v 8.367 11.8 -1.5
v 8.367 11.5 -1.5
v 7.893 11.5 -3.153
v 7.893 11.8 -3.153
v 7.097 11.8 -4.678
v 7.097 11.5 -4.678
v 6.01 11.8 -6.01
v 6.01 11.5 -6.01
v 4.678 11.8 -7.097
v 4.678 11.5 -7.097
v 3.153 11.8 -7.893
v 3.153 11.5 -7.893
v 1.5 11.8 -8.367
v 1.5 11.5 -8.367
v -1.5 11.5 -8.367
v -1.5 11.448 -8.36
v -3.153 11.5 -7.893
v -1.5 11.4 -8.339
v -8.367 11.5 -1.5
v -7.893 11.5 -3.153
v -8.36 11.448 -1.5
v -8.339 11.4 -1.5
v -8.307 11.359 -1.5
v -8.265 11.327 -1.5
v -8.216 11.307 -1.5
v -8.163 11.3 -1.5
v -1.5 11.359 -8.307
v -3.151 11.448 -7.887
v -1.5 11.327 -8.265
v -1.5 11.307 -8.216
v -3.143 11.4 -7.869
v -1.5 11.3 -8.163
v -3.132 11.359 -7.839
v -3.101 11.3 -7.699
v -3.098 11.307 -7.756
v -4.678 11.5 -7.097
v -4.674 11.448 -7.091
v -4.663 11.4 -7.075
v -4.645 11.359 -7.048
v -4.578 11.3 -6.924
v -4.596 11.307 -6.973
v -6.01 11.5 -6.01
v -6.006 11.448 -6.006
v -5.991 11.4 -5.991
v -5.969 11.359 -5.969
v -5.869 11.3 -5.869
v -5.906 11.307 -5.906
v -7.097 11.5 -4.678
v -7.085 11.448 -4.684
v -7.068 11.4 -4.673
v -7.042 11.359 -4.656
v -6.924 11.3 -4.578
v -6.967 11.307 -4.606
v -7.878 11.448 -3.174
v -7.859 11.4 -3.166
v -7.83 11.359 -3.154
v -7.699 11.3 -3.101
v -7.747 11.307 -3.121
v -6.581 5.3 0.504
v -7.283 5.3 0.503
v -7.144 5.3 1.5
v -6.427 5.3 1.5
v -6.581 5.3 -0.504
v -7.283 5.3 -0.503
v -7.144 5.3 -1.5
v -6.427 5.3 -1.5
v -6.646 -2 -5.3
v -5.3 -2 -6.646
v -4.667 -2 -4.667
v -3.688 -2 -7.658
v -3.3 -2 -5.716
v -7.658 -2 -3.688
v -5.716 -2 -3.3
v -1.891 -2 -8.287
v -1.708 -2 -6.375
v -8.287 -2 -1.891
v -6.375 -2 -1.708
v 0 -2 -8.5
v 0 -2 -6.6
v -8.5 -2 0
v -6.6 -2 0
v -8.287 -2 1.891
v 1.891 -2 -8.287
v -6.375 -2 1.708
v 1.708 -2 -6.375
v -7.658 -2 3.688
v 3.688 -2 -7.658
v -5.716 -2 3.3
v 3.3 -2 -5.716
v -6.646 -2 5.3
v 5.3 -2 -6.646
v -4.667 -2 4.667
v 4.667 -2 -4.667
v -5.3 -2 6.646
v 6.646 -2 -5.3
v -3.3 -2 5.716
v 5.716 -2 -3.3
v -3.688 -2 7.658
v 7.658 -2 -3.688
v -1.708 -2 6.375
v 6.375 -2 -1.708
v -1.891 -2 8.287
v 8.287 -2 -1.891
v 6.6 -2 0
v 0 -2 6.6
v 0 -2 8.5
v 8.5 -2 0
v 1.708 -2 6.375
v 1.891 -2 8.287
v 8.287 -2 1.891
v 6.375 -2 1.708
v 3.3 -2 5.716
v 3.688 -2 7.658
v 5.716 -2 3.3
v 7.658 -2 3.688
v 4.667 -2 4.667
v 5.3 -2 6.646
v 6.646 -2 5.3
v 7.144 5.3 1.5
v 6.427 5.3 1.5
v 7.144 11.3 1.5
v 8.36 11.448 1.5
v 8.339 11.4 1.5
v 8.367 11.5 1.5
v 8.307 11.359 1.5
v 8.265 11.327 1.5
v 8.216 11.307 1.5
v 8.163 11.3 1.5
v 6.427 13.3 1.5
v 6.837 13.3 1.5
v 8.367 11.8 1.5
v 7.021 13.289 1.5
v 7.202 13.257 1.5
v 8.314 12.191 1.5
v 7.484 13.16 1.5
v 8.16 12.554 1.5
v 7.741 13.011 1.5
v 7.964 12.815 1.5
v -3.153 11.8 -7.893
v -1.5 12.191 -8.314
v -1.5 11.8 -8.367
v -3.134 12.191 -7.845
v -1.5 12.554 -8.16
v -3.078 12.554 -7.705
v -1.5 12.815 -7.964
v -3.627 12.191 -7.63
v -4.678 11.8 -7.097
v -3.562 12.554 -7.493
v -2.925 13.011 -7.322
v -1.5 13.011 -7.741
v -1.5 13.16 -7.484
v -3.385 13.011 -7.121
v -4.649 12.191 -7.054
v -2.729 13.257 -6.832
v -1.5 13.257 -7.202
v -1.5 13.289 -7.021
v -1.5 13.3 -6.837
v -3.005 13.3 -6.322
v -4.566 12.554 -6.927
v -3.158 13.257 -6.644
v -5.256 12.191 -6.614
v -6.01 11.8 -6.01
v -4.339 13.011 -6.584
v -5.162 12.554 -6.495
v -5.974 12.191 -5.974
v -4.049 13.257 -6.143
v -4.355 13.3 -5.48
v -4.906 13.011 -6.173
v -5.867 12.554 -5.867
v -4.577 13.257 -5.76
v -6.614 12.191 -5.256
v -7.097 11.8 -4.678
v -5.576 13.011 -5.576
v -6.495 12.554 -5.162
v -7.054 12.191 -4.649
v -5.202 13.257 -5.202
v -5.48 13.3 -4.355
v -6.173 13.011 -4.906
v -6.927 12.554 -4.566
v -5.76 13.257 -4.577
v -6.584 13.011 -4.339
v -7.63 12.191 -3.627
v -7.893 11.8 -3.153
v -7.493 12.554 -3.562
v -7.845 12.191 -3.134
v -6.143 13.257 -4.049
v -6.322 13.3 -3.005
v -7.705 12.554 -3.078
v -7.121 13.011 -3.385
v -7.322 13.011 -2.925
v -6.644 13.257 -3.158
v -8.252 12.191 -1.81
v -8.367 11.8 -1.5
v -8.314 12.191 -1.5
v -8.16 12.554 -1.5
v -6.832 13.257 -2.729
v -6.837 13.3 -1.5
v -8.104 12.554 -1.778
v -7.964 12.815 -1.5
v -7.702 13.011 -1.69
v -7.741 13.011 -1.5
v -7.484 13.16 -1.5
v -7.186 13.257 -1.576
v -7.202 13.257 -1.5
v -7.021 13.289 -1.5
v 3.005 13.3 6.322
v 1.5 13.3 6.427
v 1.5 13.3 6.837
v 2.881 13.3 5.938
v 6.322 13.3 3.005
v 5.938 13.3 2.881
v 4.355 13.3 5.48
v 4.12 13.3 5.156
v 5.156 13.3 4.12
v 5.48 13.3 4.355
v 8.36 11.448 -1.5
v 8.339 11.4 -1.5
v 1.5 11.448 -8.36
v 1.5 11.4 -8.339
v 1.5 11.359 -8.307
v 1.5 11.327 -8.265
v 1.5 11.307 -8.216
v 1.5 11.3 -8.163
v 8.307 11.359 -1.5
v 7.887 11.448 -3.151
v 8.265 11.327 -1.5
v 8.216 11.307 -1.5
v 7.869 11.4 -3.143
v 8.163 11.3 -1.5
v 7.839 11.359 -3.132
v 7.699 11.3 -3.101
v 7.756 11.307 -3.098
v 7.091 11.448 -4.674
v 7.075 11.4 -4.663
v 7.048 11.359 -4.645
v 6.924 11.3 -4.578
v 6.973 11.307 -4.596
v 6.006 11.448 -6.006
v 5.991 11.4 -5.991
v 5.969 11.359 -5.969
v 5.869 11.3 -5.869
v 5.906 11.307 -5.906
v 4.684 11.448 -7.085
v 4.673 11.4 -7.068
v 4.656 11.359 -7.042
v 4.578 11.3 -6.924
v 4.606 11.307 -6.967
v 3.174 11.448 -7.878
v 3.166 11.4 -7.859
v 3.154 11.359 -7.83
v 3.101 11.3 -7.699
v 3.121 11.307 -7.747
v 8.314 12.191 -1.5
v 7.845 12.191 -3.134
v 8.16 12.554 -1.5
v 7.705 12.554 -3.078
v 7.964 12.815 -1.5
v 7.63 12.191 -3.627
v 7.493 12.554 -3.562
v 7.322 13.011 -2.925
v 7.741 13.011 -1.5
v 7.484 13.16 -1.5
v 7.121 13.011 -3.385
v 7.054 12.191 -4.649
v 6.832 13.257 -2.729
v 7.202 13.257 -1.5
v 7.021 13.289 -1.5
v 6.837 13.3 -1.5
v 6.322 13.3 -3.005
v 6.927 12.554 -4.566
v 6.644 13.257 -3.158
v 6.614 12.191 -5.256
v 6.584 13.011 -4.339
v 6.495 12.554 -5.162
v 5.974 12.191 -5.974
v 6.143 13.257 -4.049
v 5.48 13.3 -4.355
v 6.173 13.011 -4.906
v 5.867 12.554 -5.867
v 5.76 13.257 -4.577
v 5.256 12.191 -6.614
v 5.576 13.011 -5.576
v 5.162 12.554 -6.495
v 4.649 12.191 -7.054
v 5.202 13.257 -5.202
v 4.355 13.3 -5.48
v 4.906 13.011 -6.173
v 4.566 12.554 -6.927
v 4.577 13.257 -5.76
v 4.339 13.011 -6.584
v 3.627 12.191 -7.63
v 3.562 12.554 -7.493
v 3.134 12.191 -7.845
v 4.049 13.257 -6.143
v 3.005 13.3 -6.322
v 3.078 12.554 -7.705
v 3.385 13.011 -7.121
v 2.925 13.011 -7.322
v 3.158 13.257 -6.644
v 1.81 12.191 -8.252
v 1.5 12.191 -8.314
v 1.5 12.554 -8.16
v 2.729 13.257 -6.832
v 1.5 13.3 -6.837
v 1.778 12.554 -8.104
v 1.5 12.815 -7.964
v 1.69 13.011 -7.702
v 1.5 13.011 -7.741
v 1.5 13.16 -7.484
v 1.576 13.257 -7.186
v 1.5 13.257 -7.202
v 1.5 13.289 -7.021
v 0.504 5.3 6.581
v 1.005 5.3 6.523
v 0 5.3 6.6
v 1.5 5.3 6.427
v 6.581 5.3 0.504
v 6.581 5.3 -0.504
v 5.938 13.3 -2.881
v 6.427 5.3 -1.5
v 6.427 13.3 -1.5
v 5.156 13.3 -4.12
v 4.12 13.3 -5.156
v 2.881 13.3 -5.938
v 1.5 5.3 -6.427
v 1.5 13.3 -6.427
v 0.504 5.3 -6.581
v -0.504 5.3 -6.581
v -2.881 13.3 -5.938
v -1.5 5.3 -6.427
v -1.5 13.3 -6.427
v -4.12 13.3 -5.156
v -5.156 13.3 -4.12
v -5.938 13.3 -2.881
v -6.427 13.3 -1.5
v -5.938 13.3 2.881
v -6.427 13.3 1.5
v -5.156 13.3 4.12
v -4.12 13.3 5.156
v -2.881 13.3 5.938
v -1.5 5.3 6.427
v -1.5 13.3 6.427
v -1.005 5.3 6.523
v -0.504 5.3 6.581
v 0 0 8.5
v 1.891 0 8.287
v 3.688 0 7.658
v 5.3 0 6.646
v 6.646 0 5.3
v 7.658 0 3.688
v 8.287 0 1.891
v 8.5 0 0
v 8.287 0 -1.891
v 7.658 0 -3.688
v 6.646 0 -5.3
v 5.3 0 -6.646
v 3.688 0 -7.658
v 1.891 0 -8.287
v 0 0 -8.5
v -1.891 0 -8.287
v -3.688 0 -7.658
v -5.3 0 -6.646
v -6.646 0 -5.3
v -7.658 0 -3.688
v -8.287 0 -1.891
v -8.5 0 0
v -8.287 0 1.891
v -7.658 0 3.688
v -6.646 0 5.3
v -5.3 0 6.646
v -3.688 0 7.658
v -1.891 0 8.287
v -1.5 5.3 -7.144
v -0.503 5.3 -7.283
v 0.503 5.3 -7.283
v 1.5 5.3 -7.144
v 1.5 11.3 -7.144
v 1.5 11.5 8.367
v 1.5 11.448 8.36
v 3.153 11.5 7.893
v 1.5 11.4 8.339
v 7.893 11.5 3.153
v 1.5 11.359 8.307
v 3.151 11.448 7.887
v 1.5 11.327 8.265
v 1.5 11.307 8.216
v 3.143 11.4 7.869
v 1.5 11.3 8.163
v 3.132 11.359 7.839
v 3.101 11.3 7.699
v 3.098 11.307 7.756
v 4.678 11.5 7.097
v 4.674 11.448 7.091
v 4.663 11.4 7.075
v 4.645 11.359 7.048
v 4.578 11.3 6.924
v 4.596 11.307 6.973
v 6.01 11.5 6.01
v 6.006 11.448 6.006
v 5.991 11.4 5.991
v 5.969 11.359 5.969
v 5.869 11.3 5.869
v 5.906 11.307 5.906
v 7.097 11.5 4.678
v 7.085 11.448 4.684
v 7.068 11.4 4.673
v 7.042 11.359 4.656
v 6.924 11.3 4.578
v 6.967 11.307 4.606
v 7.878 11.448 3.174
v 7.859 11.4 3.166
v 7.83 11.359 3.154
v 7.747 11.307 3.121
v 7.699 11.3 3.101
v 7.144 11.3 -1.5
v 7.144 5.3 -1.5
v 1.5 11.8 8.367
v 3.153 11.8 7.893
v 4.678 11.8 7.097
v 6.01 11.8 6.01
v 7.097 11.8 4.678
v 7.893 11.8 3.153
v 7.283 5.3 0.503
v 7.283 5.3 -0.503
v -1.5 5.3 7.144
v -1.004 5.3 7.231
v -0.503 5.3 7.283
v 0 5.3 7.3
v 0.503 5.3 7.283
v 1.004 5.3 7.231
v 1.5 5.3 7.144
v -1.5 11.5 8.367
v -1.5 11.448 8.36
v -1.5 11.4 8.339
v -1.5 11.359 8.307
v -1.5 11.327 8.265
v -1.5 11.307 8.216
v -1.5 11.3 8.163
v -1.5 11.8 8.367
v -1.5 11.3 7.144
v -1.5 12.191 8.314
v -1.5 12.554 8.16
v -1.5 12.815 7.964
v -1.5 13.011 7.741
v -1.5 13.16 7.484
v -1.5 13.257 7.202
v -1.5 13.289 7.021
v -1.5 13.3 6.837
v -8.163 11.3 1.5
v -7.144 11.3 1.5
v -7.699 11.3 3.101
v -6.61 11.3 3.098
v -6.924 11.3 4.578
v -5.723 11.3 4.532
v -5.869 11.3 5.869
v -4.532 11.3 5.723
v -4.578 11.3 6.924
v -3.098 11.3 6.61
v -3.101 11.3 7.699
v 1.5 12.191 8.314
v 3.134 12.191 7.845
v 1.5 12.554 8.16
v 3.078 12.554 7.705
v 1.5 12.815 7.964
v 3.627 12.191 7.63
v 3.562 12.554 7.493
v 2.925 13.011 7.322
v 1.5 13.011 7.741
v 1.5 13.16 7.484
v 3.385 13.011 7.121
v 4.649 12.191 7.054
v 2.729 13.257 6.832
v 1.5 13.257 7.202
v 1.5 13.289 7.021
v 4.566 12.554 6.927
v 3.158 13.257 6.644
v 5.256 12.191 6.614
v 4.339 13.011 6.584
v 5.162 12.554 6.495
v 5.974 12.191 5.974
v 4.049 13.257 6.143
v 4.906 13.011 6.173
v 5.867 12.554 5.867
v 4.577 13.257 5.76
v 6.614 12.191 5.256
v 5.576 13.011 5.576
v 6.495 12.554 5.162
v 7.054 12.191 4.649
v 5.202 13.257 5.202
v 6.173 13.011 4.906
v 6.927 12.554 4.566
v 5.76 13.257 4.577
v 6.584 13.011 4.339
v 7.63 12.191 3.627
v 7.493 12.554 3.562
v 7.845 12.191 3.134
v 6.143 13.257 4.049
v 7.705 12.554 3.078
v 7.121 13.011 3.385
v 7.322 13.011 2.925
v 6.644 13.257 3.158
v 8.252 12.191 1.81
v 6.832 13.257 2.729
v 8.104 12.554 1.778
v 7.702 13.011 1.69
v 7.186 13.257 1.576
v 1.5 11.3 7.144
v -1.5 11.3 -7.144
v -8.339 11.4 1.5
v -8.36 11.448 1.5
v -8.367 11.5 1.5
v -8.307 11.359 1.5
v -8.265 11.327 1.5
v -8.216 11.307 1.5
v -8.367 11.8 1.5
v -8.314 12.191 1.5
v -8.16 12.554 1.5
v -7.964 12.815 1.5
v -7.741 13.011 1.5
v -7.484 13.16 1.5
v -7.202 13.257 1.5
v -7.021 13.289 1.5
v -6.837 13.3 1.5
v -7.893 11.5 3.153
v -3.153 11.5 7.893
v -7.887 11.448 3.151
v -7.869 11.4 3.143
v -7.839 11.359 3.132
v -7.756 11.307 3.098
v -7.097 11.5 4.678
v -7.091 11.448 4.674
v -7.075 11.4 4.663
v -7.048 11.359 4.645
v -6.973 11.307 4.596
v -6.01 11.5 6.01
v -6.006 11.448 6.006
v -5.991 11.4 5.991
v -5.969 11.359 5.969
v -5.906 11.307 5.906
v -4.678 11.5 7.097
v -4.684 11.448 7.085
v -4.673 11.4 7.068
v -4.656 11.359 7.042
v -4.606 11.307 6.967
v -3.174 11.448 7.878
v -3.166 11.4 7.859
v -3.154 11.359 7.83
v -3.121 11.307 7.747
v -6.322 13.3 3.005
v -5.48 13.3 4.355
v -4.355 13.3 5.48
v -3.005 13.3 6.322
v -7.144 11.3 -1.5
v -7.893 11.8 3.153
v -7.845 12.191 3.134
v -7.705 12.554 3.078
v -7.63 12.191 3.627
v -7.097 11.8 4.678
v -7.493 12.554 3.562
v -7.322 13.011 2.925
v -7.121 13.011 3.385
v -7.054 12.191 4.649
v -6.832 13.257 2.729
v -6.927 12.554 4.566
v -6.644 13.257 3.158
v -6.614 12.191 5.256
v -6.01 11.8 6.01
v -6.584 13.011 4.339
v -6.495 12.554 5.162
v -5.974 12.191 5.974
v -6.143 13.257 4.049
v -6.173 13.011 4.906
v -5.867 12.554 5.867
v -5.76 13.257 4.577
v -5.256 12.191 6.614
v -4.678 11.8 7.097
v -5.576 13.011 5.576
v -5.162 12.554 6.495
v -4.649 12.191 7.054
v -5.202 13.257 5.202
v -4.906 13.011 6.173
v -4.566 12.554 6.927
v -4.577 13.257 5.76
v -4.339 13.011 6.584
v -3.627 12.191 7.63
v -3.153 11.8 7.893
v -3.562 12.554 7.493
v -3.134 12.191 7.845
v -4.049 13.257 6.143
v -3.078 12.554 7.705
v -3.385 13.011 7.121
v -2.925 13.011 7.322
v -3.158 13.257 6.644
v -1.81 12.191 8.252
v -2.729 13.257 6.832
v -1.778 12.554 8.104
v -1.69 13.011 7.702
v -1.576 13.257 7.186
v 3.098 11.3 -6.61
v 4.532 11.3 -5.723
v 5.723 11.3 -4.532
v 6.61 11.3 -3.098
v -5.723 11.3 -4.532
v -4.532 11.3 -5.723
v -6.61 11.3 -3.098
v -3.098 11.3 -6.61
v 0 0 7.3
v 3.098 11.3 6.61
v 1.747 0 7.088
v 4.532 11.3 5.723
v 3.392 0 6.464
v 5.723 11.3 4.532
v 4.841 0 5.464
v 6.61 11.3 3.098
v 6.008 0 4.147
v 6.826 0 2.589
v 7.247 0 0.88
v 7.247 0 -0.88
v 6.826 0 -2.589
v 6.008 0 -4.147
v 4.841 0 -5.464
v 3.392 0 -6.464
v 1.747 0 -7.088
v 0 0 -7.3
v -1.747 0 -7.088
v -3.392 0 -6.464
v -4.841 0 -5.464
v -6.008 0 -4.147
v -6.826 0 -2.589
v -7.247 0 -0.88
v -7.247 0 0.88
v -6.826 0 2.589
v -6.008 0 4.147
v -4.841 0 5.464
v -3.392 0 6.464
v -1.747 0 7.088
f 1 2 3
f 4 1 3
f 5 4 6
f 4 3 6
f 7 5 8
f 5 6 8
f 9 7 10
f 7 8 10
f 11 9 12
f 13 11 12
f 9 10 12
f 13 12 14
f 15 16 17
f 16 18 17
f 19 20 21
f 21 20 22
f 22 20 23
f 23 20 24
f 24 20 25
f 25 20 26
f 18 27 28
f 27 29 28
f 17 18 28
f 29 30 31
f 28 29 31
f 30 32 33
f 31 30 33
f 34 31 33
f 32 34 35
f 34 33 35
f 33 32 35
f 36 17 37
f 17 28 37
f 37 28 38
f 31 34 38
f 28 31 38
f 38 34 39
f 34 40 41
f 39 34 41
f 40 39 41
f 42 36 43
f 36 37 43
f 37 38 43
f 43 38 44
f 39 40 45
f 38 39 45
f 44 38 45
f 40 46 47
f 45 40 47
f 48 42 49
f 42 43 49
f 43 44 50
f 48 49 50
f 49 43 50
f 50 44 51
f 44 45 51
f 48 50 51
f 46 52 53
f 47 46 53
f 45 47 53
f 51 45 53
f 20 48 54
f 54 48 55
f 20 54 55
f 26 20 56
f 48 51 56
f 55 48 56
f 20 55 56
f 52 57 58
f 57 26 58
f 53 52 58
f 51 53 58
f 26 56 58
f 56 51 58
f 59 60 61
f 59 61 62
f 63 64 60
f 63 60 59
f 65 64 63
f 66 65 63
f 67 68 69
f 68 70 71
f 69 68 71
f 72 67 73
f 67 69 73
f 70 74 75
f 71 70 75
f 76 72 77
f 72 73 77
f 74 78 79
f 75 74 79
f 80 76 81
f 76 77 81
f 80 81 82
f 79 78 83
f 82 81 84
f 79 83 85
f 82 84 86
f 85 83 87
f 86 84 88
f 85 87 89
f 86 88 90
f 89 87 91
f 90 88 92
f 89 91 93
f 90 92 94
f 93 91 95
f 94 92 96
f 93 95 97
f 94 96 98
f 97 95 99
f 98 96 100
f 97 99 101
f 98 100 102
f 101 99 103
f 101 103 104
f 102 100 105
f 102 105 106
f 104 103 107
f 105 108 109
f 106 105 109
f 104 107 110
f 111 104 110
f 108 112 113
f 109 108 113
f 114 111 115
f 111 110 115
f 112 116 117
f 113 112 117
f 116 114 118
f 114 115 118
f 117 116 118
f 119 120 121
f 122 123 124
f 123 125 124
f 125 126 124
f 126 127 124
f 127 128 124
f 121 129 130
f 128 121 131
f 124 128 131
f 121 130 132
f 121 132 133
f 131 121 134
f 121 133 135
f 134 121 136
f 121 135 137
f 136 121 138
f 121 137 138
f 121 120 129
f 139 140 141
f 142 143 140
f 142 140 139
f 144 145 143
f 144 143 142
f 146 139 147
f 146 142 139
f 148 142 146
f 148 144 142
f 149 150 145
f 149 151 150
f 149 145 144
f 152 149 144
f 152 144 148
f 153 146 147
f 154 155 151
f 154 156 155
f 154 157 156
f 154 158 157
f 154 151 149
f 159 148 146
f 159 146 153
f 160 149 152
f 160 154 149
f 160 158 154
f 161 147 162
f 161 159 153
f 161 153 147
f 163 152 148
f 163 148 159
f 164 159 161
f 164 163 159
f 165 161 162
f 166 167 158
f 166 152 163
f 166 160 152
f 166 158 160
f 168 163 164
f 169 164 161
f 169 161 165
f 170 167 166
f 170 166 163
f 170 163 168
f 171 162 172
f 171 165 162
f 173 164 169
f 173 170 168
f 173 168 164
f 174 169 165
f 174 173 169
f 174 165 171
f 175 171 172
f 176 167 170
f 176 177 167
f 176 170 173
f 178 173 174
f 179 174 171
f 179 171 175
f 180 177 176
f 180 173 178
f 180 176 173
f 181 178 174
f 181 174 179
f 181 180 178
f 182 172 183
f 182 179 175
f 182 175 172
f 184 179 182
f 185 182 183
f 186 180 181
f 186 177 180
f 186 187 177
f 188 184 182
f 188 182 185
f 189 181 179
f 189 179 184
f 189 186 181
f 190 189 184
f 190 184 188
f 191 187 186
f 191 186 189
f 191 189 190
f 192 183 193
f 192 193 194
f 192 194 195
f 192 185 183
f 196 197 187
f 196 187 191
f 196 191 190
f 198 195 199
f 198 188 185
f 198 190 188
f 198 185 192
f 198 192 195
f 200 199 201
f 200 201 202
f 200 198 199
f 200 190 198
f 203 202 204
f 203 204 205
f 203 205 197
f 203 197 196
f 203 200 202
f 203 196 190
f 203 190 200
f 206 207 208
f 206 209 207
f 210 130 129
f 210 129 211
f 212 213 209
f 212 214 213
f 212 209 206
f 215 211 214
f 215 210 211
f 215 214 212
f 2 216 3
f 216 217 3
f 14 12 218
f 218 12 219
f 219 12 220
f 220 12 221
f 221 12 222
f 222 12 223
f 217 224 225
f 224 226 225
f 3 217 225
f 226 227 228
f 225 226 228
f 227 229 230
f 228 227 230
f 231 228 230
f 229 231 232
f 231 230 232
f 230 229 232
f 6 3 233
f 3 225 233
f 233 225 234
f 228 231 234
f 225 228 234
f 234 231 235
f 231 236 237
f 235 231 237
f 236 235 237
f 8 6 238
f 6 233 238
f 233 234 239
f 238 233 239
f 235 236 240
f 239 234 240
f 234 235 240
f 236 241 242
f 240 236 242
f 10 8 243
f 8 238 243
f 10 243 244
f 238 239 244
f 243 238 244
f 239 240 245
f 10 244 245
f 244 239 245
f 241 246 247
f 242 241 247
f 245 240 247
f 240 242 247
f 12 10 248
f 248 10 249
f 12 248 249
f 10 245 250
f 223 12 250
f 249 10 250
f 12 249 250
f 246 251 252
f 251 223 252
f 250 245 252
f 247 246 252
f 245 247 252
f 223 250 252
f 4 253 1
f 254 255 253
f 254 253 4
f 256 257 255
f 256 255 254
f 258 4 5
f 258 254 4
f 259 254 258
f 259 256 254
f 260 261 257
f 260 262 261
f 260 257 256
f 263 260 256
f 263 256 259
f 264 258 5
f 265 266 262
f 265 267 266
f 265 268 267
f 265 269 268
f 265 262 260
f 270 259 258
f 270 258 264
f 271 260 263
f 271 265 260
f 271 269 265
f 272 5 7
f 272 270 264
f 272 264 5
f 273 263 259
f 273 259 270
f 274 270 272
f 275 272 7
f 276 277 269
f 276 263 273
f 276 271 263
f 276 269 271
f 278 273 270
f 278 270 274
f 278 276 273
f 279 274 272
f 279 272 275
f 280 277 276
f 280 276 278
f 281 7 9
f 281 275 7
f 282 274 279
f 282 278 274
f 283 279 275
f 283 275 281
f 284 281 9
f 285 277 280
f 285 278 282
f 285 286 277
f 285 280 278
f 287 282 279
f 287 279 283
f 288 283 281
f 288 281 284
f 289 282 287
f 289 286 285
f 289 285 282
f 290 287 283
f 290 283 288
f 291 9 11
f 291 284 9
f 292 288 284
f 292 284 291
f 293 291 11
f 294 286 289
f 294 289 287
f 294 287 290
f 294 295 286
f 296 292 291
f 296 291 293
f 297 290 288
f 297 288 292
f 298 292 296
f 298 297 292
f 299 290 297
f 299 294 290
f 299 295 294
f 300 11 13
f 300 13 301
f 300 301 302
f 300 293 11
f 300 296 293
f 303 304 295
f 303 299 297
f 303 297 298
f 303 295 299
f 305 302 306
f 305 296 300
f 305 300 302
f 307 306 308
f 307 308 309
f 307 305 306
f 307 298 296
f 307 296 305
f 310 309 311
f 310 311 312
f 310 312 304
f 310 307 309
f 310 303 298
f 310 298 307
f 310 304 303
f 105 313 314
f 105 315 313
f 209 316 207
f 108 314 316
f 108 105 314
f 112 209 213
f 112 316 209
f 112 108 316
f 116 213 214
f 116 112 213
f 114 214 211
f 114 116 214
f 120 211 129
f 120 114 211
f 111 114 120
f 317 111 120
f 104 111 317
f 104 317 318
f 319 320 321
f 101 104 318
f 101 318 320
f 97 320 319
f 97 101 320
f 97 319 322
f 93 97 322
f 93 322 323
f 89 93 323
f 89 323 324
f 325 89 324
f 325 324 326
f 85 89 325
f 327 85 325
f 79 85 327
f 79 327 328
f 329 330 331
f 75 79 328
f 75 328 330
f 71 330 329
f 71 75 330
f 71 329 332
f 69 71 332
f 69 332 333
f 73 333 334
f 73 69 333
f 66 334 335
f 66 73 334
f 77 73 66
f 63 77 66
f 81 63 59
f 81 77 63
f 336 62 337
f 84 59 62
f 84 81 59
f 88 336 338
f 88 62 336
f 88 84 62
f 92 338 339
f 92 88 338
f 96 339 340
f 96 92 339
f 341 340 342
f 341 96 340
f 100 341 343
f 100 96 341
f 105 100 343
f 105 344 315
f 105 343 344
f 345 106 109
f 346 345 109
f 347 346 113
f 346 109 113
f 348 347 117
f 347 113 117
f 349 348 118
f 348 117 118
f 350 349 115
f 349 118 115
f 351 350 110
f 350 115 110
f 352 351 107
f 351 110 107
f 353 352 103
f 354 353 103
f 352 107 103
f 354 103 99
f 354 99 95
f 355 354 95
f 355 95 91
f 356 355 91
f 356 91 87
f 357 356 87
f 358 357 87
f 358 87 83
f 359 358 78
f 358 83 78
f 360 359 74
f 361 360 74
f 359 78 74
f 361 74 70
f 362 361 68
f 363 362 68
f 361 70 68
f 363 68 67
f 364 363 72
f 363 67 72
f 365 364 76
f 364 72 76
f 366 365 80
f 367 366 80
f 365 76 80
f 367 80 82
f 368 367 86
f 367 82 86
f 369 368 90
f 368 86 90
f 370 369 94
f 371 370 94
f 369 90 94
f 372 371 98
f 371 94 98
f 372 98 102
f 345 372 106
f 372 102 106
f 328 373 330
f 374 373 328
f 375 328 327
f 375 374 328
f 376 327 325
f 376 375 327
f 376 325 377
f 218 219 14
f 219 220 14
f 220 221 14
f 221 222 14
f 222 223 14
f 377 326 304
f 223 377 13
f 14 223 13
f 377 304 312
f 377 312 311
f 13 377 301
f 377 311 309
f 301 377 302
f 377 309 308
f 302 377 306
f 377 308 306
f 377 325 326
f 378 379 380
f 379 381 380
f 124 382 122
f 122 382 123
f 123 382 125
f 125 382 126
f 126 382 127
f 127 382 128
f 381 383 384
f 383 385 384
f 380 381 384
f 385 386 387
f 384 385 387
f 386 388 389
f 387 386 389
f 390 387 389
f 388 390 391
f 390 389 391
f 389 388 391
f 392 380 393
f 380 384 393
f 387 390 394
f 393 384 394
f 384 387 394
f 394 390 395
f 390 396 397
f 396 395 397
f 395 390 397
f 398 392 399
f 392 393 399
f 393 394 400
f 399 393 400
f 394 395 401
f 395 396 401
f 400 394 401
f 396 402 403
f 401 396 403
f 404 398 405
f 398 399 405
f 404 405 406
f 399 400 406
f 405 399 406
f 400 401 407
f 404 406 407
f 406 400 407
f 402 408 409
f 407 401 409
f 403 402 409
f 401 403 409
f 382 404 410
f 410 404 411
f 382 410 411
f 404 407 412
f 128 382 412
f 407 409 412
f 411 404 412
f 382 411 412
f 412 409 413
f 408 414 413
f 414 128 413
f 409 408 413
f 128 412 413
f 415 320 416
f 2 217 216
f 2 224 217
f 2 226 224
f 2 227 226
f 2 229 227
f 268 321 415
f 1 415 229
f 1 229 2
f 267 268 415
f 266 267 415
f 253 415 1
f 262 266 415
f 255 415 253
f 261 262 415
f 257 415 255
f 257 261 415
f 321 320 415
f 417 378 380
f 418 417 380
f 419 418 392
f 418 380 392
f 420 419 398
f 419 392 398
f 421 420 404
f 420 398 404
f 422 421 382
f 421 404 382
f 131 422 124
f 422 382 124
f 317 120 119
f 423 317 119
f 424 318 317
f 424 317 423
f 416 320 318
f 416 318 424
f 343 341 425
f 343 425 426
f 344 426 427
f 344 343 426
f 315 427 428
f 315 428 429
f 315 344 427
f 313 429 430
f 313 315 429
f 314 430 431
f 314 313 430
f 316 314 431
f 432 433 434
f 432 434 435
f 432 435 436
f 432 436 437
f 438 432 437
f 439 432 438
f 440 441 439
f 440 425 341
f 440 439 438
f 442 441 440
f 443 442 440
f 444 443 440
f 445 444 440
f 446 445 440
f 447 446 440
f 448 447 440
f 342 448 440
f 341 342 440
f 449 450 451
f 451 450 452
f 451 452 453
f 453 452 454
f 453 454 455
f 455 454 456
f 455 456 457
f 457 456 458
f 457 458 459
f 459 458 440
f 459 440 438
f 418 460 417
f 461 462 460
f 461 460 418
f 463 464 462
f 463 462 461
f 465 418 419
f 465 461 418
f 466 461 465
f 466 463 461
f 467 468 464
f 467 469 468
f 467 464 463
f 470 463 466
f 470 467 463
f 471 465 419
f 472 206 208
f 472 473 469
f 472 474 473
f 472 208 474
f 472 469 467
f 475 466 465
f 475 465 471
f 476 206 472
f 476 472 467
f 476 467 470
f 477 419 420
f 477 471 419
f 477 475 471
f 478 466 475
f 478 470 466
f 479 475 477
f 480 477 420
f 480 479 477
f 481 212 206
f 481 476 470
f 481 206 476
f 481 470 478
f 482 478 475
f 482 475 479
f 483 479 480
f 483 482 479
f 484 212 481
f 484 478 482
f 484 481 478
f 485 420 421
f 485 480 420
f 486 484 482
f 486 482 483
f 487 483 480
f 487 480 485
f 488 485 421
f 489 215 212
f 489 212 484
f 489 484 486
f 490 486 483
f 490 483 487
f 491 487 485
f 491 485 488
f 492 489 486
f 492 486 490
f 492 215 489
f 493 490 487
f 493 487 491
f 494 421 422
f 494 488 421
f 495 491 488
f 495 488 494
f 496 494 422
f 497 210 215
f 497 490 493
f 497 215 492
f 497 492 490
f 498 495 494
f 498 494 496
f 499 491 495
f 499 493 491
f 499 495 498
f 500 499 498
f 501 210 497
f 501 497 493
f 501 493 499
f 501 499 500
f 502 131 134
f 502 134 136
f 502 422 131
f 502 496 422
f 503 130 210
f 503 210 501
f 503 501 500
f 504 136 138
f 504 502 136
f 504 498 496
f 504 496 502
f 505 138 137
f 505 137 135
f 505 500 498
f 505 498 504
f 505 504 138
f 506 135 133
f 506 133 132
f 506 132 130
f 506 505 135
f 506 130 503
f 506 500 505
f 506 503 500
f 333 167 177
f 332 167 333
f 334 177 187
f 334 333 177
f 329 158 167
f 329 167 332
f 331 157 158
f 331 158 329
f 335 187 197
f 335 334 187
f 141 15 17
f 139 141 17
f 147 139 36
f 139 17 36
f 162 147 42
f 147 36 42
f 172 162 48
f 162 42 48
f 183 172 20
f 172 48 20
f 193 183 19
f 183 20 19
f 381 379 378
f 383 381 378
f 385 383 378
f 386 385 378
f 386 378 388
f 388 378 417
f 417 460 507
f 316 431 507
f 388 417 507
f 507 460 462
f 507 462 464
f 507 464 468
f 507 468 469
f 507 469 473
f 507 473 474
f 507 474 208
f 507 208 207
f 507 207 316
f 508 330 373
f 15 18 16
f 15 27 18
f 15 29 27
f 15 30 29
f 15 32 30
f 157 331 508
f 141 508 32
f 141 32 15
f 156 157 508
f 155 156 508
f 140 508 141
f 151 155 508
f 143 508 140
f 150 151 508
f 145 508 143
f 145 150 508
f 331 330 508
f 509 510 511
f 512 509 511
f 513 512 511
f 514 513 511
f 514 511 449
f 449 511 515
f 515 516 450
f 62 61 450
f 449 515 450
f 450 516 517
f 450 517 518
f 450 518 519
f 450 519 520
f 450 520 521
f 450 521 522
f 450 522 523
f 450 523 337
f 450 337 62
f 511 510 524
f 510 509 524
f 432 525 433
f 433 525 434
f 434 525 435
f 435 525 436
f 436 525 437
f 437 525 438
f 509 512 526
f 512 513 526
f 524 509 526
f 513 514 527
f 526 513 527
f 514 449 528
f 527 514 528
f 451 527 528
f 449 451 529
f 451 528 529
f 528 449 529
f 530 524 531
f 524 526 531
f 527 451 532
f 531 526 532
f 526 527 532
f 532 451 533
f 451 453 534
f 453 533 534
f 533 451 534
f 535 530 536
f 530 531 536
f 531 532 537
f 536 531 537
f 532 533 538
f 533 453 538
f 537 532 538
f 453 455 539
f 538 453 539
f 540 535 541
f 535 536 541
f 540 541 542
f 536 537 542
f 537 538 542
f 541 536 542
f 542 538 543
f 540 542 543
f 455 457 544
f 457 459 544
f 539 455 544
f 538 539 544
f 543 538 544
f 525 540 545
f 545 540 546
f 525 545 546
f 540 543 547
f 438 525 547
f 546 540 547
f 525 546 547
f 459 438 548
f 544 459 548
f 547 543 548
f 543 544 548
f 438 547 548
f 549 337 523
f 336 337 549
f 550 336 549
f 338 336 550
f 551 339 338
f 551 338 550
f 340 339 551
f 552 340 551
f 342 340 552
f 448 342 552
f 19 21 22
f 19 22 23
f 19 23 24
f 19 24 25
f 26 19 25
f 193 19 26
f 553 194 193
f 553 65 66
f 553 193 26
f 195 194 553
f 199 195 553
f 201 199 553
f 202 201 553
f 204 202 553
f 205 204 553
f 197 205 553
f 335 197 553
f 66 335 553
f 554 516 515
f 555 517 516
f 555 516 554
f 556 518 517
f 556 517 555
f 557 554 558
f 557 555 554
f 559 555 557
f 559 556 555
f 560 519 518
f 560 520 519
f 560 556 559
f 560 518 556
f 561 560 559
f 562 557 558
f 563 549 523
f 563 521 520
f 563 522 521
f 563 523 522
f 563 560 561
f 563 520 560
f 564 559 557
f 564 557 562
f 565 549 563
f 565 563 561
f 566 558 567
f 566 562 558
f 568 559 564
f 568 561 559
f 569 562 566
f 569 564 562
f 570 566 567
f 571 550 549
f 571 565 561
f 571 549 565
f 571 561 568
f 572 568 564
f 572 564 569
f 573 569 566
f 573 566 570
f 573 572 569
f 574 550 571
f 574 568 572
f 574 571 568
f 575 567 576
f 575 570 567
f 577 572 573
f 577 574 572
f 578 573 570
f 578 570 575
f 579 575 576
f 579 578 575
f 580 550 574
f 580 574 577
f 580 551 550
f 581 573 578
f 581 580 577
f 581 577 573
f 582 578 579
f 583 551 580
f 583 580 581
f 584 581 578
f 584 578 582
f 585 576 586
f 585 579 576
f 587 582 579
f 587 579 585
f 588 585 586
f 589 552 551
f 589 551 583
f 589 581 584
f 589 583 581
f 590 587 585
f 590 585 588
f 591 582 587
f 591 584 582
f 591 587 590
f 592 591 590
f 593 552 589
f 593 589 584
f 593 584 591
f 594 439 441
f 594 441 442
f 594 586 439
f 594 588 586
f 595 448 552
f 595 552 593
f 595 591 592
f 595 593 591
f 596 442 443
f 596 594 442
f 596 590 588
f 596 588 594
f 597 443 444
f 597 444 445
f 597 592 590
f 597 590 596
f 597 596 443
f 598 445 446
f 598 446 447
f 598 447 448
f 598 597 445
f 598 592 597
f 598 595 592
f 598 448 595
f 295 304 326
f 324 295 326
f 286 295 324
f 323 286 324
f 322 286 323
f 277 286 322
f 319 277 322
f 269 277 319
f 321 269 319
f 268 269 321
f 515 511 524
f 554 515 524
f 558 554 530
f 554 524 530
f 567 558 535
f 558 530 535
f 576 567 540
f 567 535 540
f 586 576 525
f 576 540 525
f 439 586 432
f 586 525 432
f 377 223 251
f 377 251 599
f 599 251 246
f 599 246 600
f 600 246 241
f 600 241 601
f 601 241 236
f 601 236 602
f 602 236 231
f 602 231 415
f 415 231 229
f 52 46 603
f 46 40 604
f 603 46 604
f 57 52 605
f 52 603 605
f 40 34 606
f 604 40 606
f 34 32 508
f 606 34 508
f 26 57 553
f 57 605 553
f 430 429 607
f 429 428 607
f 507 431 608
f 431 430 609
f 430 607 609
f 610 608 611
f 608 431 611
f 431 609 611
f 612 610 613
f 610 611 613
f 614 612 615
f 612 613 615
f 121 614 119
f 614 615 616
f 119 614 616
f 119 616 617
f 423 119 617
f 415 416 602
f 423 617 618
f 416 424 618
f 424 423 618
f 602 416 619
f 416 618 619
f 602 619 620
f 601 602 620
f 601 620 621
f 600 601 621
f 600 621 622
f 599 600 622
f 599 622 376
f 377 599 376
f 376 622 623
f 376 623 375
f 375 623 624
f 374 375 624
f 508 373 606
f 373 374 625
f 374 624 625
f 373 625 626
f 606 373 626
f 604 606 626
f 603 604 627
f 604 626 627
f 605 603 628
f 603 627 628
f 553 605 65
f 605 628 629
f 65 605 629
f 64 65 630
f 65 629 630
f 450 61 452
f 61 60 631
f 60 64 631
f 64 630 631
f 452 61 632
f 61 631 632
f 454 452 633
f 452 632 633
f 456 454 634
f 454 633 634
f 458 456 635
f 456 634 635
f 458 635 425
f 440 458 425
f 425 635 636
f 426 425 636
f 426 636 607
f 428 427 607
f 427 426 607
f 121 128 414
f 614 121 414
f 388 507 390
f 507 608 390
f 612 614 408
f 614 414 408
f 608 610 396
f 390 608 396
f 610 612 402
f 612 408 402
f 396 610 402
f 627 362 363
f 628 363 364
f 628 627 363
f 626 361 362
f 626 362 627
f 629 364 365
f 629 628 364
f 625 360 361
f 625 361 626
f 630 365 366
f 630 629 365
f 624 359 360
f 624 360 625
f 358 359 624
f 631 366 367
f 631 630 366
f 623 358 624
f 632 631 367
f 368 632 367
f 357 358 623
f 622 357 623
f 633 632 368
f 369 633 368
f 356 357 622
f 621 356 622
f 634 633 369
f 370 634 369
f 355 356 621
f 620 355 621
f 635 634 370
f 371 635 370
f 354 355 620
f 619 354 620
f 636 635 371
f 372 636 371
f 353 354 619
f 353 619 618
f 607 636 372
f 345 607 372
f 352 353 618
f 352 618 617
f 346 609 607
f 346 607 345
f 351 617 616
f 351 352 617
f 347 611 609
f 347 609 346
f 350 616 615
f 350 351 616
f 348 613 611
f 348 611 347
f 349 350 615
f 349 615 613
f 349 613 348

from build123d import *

# Parameters (mm, degrees)
SKETCH1_R           = 7.3
SKETCH1_R_2         = 6.6
BOSS_EXTRUDE1_DEPTH = 11.3
BOSS_EXTRUDE2_START = -2
SKETCH1_3_R         = 8.5
SKETCH1_3_R_2       = 6.6
BOSS_EXTRUDE2_DEPTH = 2
BOSS_EXTRUDE3_START = 11.3
SKETCH1_4_R         = 8.5
SKETCH1_4_R_2       = 6.6
BOSS_EXTRUDE3_DEPTH = 2
FILLET1_R           = 1.5
FILLET2_R           = 0.2
CUT_EXTRUDE1_START  = 13.3
SKETCH1_6_W         = 18
SKETCH1_6_H         = 3
CUT_EXTRUDE1_DEPTH  = 8
CUT_EXTRUDE3_START  = 13.3
SKETCH3_W           = 3
SKETCH3_H           = 22.651300202
CUT_EXTRUDE3_DEPTH  = 8


with BuildPart() as part:
    # Sketch1 → Boss-Extrude1 (new body)
    with BuildSketch(Plane(origin=(0, 0, 0), x_dir=(1, 0, 0), z_dir=(0, 1, 0))):
        with Locations(Location((0, 0, 0), (0, 0, 270))):
            Circle(SKETCH1_R)
        with Locations(Location((0, 0, 0), (0, 0, 270))):
            Circle(SKETCH1_R_2, mode=Mode.SUBTRACT)
    extrude(amount=BOSS_EXTRUDE1_DEPTH)

    # Sketch1<3> → Boss-Extrude2 (add)
    with BuildSketch(Plane(origin=(0, 0, 0), x_dir=(1, 0, 0), z_dir=(0, 1, 0)).offset(BOSS_EXTRUDE2_START)):
        with Locations(Location((0, 0, 0), (0, 0, 270))):
            Circle(SKETCH1_3_R)
        with Locations(Location((0, 0, 0), (0, 0, 270))):
            Circle(SKETCH1_3_R_2, mode=Mode.SUBTRACT)
    extrude(amount=BOSS_EXTRUDE2_DEPTH)

    # Sketch1<4> → Boss-Extrude3 (add)
    with BuildSketch(Plane(origin=(0, 0, 0), x_dir=(1, 0, 0), z_dir=(0, 1, 0)).offset(BOSS_EXTRUDE3_START)):
        with Locations(Location((0, 0, 0), (0, 0, 270))):
            Circle(SKETCH1_4_R)
        with Locations(Location((0, 0, 0), (0, 0, 270))):
            Circle(SKETCH1_4_R_2, mode=Mode.SUBTRACT)
    extrude(amount=BOSS_EXTRUDE3_DEPTH)

    # Fillet1
    fillet1_edges = [part.edges().sort_by_distance(p)[0] for p in [
        (0, 13.3, -8.5),
    ]]
    fillet(fillet1_edges, radius=FILLET1_R)

    # Fillet2
    fillet2_edges = [part.edges().sort_by_distance(p)[0] for p in [
        (0, 11.3, -8.5),
    ]]
    fillet(fillet2_edges, radius=FILLET2_R)

    # Sketch1<6> → Cut-Extrude1 (cut)
    with BuildSketch(Plane(origin=(0, 0, 0), x_dir=(1, 0, 0), z_dir=(0, 1, 0)).offset(CUT_EXTRUDE1_START)):
        Rectangle(SKETCH1_6_W, SKETCH1_6_H)
    extrude(amount=-CUT_EXTRUDE1_DEPTH, mode=Mode.SUBTRACT)

    # Sketch3 → Cut-Extrude3 (cut)
    with BuildSketch(Plane(origin=(0, 0, 0), x_dir=(1, 0, 0), z_dir=(0, 1, 0)).offset(CUT_EXTRUDE3_START)):
        Rectangle(SKETCH3_W, SKETCH3_H)
    extrude(amount=-CUT_EXTRUDE3_DEPTH, mode=Mode.SUBTRACT)


solid = part.part
